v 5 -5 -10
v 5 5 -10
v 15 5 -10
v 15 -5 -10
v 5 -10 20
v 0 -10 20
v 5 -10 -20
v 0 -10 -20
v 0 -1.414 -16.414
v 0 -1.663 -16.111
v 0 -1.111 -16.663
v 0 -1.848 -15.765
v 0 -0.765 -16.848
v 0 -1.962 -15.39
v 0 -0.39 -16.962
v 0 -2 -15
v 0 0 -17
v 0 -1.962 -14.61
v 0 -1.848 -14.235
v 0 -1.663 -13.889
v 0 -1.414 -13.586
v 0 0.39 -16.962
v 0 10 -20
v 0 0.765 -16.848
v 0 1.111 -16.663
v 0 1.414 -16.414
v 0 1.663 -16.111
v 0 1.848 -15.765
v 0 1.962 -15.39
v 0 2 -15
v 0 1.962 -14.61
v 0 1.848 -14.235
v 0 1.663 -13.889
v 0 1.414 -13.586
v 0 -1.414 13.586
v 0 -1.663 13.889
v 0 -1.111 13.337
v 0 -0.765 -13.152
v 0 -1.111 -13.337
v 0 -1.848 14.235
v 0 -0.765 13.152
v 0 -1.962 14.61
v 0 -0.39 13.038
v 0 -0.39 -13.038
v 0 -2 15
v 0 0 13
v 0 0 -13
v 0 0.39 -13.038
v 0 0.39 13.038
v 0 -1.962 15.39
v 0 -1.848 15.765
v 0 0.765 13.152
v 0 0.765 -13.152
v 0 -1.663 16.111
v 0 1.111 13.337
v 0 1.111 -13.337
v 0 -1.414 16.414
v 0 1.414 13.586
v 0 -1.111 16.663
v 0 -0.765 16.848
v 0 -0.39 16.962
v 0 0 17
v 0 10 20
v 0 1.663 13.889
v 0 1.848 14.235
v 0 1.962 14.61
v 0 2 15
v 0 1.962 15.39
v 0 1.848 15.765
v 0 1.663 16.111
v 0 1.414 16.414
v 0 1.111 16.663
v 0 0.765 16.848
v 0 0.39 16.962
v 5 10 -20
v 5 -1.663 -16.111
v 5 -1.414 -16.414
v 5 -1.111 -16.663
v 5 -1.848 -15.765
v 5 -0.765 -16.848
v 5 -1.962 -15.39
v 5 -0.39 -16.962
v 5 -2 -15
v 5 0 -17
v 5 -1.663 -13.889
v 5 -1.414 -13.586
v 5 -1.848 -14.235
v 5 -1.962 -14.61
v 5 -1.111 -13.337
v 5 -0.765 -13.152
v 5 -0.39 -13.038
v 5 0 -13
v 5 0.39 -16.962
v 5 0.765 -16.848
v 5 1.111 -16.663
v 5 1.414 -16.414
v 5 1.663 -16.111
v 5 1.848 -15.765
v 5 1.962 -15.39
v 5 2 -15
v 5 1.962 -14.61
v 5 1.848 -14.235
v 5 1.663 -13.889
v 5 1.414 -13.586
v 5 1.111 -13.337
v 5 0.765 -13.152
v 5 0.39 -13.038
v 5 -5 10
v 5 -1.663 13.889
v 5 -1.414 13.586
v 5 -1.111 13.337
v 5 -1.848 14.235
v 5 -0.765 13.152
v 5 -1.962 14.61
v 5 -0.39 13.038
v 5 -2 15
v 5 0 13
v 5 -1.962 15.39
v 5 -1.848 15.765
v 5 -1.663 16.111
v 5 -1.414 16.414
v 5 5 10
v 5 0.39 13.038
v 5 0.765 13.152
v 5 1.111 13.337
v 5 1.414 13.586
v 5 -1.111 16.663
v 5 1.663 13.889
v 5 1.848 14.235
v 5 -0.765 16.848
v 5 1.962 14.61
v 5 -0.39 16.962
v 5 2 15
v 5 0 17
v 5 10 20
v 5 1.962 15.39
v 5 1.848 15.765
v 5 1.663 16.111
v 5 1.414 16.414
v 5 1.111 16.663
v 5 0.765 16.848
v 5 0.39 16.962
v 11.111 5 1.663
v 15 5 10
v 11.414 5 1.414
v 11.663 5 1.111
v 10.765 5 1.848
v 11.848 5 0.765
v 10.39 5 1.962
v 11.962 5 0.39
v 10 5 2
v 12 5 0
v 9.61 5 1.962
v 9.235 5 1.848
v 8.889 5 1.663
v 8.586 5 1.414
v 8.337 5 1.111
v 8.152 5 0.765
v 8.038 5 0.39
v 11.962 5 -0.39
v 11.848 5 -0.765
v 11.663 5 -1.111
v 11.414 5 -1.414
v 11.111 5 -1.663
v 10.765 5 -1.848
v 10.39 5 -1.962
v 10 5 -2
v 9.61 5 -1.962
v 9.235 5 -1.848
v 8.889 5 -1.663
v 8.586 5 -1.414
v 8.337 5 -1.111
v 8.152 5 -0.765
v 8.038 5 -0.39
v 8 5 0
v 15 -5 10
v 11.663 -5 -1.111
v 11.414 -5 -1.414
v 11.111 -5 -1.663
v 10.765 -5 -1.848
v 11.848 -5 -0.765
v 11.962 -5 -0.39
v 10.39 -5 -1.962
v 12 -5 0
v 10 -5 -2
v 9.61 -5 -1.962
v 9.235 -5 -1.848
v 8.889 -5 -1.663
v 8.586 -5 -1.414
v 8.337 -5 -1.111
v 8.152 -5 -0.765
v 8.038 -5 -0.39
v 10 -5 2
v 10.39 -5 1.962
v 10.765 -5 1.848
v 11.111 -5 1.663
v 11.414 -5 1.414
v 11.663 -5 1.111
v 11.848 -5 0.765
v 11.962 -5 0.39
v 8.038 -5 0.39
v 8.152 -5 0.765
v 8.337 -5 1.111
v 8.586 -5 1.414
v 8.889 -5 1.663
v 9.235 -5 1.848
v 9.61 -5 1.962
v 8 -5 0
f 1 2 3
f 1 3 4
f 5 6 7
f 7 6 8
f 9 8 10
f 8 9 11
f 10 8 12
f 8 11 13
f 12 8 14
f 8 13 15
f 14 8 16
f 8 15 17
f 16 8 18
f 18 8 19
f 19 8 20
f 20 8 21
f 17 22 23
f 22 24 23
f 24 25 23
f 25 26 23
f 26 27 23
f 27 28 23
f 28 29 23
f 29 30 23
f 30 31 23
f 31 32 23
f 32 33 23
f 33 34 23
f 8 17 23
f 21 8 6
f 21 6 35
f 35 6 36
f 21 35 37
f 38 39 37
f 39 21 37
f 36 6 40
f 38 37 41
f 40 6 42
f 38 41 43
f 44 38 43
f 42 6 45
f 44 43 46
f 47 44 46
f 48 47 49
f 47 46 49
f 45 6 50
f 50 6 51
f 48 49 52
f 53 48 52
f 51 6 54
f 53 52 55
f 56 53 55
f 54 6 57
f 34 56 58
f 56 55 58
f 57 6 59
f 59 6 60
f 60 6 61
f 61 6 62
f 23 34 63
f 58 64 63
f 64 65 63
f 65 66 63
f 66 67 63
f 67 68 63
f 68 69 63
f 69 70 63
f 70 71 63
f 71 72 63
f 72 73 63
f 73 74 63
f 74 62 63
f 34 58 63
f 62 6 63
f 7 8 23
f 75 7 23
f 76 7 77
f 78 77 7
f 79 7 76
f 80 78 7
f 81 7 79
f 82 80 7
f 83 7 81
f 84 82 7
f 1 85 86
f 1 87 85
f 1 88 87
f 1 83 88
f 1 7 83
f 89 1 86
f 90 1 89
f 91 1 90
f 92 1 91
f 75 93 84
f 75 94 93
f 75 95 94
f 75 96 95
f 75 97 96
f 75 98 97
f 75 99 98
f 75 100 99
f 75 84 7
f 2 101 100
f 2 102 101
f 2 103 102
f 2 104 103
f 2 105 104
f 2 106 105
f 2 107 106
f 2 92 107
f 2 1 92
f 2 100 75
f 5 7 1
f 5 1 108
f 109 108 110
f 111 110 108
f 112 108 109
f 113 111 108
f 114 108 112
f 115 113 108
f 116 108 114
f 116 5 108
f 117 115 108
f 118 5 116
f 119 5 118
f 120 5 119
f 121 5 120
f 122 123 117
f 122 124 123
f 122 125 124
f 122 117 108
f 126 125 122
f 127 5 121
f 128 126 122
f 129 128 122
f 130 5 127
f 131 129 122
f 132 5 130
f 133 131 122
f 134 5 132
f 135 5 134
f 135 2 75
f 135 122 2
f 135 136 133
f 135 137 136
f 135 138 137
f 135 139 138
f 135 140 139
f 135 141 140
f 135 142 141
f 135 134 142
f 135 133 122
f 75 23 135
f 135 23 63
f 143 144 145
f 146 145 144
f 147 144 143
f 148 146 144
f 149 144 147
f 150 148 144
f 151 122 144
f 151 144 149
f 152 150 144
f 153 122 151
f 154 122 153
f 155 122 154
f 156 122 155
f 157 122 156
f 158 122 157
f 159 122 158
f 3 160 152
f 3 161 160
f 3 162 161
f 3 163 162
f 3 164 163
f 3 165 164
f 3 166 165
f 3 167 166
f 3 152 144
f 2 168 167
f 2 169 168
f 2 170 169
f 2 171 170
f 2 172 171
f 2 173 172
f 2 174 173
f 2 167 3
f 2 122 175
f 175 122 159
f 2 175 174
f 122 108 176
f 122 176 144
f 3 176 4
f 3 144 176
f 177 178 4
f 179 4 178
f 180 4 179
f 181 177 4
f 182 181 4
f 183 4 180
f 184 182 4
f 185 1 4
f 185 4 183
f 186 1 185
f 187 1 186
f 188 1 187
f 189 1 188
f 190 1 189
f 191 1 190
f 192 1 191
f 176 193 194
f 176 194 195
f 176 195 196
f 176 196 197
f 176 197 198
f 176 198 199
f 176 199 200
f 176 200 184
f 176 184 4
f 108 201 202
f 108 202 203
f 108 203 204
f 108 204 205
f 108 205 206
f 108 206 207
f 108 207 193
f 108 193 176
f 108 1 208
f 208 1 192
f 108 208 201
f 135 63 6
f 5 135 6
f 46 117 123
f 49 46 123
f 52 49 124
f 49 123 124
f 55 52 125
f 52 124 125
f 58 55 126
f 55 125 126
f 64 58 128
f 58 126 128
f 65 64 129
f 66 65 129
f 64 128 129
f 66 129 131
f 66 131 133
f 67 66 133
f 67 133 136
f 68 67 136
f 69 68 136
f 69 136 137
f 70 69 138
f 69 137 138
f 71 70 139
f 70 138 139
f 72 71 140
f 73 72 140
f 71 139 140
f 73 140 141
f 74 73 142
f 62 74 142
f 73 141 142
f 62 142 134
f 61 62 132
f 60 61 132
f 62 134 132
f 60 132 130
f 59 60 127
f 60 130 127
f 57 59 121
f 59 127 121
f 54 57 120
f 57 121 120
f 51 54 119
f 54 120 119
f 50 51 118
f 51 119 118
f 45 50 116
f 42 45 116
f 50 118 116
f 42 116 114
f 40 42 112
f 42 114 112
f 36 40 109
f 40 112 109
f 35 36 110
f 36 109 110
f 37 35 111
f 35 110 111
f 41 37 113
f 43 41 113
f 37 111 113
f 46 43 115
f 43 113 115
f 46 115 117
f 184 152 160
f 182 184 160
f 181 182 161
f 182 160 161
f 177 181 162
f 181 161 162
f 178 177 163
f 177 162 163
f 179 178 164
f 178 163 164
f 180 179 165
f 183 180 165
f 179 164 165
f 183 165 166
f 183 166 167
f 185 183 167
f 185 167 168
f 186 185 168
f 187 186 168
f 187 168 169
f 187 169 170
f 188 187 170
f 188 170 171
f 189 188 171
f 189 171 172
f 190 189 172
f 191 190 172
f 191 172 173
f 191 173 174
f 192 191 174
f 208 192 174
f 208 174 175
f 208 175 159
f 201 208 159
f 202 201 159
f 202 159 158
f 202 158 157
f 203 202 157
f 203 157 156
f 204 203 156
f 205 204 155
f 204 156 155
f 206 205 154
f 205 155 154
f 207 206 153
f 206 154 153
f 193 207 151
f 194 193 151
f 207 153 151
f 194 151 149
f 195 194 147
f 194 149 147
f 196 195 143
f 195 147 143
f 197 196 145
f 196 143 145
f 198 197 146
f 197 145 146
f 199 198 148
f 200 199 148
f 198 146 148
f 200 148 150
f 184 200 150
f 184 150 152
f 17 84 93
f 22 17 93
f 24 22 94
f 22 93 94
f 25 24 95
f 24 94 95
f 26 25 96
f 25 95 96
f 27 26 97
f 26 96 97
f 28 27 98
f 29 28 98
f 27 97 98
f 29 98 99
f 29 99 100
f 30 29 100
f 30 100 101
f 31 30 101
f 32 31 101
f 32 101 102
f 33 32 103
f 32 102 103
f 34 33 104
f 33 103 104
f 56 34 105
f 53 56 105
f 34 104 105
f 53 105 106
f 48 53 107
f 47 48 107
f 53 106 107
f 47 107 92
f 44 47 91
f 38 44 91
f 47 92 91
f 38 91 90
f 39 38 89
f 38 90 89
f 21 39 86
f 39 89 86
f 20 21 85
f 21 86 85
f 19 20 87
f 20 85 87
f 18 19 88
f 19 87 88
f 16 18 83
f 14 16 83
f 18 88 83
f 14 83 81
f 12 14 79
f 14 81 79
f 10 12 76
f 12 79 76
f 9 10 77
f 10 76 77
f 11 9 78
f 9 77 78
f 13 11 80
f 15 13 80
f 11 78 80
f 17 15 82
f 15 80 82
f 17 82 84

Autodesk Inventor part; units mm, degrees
ref_plane "YZ Plane" through (0, 0, 0) normal (1, 0, 0) x (0, 1, 0)
ref_plane "XZ Plane" through (0, 0, 0) normal (0, 1, 0) x (-1, 0, 0)
ref_plane "XY Plane" through (0, 0, 0) normal (0, 0, 1) x (1, 0, 0)
sketch "草图1" plane through (0, 0, 0) normal (1, 0, 0) x (0, 1, 0)
  line L0 (10, 20) -> (-10, 20)
  line L1 (-10, 20) -> (-10, -20)
  line L2 (-10, -20) -> (10, -20)
  line L3 (10, -20) -> (10, 20)
  point P0 (0, 0)
  dimension "d0" = 20
  dimension "d1" = 40
extrude "拉伸1" add sketch "草图1" along normal blind 5
sketch "草图2" plane through (5, 0, 0) normal (1, 0, 0) x (0, 0, -1)
  circle A0 centre (-15, 0) radius 2
  point P0 (0, 0)
  dimension "d4" = 4
extrude "拉伸2" cut sketch "草图2" against normal through all
sketch "草图3" plane through (5, 0, 0) normal (1, 0, 0) x (0, 0, -1)
  circle A0 centre (15, 0) radius 2
  point P0 (0, 0)
  dimension "d7" = 4
extrude "拉伸3" cut sketch "草图3" against normal through all
sketch "草图4" plane through (5, 0, 0) normal (1, 0, 0) x (0, 0, -1)
  line L0 (-10, 5) -> (10, 5)
  line L1 (10, 5) -> (10, -5)
  line L2 (10, -5) -> (-10, -5)
  line L3 (-10, -5) -> (-10, 5)
  point P0 (0, 0)
  dimension "d10" = 20
  dimension "d11" = 10
extrude "拉伸4" add sketch "草图4" along normal blind 10
sketch "草图5" plane through (5, 5, 10) normal (0, 1, 0) x (1, 0, 0)
  circle A0 centre (5, 10) radius 2
  point P0 (-5, 10)
  dimension "d14" = 4
extrude "拉伸5" cut sketch "草图5" against normal through all
sketch "草图6" plane through (5, 0, 0) normal (1, 0, 0) x (0, 0, -1)
  point P0 (0, 0)
equation "\"折弯半径\" = 厚度"
equation "\"折弯释压宽度\" = 厚度"
equation "\"折弯释压深度\" = 0.5 * 厚度"
equation "\"拐角释压尺寸\" = 4 * 厚度"
equation "\"最小余量\" = 2 * 厚度"
equation "\"过渡半径\" = 折弯半径"
equation "\"Jacobi半径尺寸\" = 折弯半径"
equation "\"间隙大小\" = 厚度"
equation "\"厚度\" = 0.5"
properties part number "滑竿固定器"
